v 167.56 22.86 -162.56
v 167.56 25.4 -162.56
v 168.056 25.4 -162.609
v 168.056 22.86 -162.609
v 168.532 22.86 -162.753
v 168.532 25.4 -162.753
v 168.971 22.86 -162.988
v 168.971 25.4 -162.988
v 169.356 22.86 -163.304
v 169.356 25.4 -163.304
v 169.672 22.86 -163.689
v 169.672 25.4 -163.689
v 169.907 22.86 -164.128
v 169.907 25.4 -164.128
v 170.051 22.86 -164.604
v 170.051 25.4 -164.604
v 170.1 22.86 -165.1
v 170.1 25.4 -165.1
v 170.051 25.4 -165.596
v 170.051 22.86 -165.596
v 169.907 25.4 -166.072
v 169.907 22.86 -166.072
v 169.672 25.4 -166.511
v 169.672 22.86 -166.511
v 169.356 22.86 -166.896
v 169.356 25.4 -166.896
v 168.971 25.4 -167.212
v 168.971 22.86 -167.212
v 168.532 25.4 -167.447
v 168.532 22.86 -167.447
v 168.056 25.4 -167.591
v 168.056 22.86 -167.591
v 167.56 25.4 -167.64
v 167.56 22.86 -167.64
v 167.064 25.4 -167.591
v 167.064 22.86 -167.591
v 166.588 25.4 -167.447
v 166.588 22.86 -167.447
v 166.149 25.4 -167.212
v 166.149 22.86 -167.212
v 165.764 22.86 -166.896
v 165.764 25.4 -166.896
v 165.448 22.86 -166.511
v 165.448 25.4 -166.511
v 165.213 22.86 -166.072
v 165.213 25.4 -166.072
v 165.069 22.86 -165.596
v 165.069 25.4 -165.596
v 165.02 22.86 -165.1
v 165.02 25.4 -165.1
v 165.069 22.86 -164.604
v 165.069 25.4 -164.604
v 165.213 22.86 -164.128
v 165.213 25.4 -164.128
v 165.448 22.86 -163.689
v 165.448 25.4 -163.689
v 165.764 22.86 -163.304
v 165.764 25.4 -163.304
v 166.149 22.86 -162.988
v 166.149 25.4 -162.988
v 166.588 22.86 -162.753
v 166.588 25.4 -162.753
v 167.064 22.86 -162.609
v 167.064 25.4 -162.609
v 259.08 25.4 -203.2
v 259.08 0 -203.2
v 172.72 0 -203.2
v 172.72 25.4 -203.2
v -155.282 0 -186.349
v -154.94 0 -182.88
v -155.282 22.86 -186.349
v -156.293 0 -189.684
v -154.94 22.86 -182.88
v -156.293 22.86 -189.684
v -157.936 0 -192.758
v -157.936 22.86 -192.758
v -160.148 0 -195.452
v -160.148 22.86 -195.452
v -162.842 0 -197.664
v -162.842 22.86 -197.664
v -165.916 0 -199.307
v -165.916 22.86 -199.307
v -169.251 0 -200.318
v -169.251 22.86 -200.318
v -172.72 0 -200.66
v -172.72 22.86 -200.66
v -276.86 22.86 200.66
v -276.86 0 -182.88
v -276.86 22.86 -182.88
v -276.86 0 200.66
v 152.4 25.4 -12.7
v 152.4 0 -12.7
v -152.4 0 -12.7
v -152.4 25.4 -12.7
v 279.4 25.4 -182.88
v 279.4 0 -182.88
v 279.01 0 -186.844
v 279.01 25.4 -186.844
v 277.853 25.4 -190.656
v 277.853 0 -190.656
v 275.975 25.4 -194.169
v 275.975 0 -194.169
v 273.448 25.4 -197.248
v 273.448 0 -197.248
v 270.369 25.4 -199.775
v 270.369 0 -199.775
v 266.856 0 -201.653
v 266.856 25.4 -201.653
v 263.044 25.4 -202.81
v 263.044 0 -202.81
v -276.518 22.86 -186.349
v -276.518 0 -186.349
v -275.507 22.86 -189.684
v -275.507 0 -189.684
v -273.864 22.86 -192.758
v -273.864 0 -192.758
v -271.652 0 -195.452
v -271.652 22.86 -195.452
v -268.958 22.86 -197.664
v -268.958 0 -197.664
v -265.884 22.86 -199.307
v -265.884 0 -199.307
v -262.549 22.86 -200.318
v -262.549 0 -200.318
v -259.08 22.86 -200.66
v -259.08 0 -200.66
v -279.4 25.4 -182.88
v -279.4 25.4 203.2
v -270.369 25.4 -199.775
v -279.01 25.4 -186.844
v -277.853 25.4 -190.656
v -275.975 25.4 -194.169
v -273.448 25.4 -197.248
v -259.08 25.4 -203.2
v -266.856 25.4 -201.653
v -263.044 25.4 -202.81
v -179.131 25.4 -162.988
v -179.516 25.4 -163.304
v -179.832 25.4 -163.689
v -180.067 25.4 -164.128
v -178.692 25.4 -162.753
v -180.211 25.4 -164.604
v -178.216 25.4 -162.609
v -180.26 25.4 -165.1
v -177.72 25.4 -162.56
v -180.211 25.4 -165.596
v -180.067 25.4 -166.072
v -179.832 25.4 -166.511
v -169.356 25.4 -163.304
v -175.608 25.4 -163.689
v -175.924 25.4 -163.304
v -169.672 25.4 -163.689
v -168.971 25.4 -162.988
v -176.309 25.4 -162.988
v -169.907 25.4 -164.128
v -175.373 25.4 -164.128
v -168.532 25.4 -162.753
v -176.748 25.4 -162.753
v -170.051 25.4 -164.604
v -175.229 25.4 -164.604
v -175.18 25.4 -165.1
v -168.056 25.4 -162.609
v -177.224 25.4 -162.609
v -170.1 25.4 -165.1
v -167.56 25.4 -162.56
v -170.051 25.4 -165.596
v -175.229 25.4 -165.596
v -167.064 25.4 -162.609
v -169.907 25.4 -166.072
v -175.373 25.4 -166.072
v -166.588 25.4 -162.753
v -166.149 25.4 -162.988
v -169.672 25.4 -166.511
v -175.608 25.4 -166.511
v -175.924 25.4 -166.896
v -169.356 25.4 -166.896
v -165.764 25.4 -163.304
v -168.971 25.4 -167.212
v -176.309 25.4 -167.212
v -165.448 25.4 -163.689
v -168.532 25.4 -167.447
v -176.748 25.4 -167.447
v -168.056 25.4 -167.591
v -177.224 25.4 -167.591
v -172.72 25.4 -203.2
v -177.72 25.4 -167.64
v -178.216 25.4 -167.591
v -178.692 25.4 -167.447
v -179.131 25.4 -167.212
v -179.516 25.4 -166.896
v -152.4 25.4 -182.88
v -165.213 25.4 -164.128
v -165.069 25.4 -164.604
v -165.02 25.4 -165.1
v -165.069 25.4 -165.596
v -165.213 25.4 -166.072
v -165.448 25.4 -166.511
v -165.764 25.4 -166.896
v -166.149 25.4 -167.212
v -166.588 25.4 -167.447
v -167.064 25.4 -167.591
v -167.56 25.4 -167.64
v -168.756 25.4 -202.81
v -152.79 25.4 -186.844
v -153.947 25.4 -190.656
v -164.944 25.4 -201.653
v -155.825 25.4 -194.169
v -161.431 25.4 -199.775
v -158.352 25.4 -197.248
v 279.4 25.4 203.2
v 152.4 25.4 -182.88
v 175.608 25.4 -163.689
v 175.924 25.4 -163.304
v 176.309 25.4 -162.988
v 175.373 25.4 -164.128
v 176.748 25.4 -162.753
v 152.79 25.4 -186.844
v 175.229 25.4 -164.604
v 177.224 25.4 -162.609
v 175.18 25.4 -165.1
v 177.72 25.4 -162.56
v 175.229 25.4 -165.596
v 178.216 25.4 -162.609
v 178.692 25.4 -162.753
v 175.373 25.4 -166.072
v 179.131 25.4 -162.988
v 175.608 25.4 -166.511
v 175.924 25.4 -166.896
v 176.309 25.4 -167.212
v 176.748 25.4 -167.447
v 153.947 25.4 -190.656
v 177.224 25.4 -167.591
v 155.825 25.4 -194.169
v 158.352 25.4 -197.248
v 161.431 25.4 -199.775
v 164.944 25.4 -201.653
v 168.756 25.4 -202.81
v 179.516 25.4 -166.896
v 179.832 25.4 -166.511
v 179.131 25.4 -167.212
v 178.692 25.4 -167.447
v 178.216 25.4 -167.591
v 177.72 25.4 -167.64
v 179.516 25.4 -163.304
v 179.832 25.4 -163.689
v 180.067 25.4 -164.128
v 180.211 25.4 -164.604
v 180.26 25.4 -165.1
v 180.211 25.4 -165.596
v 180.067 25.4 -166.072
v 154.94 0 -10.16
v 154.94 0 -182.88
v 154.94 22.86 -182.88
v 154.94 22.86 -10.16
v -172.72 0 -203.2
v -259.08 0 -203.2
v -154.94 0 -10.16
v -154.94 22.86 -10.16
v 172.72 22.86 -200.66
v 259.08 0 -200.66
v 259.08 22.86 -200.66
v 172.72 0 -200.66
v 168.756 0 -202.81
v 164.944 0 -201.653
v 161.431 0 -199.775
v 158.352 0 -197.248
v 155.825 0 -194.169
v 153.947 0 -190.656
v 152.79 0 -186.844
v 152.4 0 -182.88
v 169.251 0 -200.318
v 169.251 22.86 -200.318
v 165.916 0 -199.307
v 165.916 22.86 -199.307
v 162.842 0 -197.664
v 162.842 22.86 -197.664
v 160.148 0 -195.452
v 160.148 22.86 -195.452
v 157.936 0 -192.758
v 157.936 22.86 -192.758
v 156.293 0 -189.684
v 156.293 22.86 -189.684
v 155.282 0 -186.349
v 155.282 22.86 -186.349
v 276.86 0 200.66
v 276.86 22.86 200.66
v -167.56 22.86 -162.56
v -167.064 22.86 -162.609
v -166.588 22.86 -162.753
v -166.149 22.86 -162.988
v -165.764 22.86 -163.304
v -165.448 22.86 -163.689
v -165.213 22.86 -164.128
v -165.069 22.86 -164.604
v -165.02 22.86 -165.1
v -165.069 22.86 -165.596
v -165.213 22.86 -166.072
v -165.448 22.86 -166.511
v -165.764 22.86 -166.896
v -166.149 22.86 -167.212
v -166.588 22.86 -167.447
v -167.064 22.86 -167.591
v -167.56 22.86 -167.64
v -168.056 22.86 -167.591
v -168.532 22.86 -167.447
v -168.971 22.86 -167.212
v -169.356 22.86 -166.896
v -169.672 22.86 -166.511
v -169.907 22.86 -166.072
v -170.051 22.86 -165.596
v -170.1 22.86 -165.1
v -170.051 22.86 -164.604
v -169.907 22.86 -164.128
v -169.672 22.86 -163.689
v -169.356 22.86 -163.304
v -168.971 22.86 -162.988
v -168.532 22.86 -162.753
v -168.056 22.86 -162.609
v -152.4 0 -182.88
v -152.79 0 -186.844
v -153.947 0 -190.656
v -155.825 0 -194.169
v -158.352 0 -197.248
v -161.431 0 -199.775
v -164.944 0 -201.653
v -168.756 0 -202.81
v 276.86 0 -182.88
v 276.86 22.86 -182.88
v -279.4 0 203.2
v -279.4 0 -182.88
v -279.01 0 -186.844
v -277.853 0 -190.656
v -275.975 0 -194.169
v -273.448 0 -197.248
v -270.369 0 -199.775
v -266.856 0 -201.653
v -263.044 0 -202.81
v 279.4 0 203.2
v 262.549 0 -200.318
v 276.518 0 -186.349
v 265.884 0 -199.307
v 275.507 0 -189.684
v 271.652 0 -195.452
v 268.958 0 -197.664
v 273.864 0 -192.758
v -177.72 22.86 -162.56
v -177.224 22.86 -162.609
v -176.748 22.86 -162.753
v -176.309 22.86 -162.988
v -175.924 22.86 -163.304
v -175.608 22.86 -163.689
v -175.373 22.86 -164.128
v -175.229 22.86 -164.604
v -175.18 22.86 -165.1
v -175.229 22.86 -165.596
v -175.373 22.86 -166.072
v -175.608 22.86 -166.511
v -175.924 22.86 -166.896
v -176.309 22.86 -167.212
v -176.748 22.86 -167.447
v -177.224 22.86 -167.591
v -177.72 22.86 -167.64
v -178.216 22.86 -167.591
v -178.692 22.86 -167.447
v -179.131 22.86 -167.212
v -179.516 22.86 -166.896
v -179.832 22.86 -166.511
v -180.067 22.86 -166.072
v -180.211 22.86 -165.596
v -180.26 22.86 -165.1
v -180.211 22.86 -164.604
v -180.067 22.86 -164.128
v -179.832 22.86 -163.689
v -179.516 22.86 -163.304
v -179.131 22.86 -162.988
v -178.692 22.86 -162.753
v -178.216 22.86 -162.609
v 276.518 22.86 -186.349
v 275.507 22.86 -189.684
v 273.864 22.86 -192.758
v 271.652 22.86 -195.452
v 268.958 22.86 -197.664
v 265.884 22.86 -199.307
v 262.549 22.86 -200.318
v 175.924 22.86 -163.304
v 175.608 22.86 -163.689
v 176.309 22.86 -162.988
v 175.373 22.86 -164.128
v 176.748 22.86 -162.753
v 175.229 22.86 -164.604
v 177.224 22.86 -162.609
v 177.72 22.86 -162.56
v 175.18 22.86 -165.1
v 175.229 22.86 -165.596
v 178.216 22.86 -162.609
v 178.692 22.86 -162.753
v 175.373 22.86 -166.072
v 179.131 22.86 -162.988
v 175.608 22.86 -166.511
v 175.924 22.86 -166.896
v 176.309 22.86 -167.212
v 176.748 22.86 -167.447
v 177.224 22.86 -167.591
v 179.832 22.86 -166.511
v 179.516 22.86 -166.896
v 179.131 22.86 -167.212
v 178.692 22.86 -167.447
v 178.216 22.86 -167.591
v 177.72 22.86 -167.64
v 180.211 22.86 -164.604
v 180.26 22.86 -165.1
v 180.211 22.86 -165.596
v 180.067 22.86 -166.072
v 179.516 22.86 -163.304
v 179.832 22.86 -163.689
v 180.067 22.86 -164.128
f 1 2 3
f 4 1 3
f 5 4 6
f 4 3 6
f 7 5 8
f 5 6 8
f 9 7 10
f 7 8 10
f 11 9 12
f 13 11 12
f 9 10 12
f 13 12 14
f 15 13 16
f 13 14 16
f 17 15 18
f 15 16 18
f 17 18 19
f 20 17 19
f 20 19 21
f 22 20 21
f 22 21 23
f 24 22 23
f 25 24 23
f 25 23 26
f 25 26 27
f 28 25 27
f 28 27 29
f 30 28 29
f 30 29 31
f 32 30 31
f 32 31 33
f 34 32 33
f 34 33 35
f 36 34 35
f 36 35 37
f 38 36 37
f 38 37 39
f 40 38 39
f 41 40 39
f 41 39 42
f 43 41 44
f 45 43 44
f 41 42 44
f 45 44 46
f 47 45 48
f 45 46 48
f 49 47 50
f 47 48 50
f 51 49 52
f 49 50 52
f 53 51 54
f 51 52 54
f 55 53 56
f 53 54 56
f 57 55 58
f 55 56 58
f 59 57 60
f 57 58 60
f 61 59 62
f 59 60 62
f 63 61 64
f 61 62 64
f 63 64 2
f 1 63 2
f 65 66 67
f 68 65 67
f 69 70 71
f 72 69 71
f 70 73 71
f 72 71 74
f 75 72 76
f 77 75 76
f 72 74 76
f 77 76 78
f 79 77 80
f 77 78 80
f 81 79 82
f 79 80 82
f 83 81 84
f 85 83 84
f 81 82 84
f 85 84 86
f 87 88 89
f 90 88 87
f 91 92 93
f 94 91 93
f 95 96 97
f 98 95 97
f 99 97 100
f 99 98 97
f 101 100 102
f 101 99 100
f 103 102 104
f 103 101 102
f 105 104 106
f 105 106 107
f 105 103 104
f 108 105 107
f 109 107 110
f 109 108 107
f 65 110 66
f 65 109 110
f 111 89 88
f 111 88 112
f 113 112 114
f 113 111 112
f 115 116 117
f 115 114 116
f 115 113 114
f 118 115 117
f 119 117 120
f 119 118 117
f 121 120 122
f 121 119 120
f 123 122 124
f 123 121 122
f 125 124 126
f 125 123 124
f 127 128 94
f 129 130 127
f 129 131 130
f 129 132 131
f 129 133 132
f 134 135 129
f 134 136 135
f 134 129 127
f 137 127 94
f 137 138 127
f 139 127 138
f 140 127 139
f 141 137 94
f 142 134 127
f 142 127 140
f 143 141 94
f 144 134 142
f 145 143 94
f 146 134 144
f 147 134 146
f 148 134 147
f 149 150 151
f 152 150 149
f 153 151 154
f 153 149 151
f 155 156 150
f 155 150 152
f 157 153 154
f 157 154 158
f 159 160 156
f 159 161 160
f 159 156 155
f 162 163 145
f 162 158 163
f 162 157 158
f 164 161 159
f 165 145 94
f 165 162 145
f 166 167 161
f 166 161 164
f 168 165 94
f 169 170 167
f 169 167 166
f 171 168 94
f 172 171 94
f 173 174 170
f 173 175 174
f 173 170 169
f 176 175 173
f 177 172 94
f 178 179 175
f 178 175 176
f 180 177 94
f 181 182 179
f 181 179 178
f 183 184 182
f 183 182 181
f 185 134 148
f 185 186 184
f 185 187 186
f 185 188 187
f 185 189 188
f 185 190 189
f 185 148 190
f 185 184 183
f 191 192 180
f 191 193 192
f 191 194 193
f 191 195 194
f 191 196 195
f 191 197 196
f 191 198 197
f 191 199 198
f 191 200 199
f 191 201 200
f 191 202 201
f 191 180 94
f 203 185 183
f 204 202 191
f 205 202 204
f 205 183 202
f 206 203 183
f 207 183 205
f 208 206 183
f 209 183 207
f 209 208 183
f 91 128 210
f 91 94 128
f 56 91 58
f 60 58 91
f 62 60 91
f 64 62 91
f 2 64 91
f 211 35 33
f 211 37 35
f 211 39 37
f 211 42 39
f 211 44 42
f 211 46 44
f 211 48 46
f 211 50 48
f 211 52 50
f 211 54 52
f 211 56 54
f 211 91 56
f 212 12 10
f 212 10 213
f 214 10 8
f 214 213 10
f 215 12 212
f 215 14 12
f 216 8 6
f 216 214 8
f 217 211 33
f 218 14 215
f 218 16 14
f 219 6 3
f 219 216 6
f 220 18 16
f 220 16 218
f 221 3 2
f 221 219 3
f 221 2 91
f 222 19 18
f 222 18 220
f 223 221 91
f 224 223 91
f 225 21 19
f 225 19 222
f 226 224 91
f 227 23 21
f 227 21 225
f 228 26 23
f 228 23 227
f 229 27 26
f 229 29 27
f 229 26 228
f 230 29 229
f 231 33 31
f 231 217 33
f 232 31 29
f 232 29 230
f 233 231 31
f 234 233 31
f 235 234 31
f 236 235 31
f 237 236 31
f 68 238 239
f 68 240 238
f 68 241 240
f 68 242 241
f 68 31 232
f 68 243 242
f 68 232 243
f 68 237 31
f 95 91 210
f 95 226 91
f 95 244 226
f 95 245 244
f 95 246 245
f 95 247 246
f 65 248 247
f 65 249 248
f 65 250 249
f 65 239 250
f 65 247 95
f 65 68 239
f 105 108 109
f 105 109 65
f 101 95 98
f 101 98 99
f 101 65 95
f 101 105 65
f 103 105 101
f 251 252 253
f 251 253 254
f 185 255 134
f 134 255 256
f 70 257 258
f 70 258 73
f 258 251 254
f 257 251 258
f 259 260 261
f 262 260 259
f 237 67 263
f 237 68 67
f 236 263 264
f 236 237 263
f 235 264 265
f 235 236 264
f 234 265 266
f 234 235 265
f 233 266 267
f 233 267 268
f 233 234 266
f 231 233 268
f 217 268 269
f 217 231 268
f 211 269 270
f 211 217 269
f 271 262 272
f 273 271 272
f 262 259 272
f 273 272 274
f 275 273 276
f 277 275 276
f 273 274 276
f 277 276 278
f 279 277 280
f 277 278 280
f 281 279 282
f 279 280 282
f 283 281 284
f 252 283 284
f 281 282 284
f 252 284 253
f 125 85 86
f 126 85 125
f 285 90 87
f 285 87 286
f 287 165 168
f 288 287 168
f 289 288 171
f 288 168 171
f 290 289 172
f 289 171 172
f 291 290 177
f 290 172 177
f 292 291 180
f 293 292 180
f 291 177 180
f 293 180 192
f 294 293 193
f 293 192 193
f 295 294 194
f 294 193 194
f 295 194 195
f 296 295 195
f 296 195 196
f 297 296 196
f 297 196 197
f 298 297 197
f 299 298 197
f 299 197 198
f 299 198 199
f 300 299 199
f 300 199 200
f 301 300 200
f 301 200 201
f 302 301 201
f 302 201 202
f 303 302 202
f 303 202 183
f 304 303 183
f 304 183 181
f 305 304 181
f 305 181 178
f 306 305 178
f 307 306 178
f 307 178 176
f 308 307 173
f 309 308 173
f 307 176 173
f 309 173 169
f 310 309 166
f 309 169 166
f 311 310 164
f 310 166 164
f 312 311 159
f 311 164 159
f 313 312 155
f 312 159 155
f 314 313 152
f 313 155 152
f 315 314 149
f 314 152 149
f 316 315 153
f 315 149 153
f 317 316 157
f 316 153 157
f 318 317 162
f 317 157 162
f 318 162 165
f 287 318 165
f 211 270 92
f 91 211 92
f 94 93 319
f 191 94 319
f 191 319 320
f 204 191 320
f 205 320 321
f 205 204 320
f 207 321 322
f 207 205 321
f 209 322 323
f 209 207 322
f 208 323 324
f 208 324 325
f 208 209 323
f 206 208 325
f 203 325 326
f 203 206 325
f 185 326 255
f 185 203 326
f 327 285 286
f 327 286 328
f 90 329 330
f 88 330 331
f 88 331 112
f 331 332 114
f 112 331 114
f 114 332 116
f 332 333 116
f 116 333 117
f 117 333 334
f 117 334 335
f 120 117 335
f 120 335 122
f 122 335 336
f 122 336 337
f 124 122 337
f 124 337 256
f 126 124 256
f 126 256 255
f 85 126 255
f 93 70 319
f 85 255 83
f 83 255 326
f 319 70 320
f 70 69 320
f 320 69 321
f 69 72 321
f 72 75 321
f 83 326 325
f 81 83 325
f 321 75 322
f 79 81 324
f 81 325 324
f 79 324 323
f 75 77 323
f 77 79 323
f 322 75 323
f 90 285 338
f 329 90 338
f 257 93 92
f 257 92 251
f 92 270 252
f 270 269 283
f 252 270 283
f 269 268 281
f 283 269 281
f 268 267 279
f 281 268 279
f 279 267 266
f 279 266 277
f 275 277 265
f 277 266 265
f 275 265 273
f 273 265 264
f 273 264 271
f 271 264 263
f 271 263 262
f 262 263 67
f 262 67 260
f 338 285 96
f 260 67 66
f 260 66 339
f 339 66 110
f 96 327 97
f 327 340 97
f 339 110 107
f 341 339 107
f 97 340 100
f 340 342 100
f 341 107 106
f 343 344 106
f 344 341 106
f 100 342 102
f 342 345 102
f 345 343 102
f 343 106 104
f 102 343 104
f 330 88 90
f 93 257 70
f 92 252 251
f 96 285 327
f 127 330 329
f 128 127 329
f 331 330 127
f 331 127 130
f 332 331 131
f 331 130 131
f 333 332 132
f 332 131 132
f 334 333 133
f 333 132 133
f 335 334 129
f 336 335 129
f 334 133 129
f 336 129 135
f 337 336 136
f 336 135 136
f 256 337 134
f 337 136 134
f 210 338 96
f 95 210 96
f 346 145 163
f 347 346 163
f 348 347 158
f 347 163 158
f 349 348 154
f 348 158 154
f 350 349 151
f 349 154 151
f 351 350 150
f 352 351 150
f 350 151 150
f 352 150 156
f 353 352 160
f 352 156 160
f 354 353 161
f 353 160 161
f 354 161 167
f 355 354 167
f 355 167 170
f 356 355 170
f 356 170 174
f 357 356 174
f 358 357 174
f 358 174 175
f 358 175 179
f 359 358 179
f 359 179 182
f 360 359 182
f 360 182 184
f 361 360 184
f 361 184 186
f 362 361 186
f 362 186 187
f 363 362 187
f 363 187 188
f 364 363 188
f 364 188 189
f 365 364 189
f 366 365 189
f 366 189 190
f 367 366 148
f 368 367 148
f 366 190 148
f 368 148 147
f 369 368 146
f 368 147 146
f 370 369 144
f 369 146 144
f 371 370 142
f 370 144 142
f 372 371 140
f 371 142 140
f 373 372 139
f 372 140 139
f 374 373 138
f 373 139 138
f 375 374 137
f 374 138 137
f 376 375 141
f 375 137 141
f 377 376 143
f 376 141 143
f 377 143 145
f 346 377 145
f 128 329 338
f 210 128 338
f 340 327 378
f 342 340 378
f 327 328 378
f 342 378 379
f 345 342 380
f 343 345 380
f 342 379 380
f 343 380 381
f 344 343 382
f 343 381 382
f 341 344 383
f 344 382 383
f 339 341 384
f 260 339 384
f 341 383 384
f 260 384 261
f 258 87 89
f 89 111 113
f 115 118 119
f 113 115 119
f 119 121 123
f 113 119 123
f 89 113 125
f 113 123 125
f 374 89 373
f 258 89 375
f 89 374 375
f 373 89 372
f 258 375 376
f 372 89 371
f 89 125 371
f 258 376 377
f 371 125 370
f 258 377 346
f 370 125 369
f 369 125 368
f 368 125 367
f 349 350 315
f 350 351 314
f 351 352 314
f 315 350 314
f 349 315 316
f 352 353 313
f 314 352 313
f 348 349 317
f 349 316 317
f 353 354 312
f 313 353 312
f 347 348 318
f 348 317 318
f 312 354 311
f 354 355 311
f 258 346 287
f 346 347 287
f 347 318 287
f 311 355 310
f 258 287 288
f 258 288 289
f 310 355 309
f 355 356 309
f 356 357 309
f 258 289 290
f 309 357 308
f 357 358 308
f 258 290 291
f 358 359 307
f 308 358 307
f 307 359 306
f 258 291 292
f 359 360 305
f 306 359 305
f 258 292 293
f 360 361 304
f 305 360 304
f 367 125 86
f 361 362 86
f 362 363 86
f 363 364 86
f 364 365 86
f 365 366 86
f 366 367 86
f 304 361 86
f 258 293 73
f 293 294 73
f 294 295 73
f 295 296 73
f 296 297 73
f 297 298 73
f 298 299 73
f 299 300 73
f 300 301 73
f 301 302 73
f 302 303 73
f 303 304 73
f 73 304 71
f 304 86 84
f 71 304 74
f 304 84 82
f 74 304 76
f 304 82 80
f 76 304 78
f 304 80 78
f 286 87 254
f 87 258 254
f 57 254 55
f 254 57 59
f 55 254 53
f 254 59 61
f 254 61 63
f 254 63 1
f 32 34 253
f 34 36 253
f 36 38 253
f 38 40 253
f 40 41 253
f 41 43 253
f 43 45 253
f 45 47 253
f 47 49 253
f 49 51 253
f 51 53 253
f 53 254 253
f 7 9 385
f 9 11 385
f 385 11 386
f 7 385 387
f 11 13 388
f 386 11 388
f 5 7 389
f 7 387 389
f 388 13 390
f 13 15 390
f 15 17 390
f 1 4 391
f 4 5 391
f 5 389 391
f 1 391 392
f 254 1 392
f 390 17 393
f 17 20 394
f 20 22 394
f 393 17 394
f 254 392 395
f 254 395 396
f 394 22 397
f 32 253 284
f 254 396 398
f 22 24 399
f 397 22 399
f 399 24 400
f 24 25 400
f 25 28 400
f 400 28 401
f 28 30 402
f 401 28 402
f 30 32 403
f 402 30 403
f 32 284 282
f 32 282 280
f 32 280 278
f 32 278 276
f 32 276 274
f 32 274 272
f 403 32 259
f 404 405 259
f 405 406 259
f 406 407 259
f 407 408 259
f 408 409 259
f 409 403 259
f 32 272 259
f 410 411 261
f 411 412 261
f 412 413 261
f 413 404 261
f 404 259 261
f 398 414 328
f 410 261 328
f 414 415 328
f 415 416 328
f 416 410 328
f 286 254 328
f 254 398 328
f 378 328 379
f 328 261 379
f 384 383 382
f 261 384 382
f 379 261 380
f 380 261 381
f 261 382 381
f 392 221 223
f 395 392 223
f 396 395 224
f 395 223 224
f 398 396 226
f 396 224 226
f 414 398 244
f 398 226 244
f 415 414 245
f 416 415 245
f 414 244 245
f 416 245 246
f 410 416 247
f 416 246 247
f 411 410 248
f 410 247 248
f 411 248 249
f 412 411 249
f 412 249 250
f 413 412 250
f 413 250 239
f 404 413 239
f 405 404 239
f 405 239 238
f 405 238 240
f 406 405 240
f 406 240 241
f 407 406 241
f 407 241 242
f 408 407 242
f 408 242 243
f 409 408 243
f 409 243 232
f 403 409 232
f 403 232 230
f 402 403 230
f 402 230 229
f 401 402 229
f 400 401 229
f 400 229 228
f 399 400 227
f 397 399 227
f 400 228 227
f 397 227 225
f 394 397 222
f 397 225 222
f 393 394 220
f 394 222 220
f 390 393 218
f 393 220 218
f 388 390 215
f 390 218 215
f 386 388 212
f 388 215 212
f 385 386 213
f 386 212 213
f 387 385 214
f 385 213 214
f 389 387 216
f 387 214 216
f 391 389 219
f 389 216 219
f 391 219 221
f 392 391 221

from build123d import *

# Parameters (mm, degrees)
BOSS_EXTRUDE1_DEPTH = 25.4
FILLET1_R           = 20.32
SHELL1_T            = -2.54
SKETCH2_R           = 2.54
CUT_EXTRUDE1_DEPTH  = 347.409815103


with BuildPart() as part:
    # Sketch1 → Boss-Extrude1 (new body)
    with BuildSketch(Plane(origin=(0, 0, 0), x_dir=(1, 0, 0), z_dir=(0, 1, 0))):
        Polygon((-279.4, 203.2), (-279.4, -203.2), (279.4, -203.2), (279.4, 203.2), (152.4, 203.2), (152.4, 12.7), (-152.4, 12.7), (-152.4, 203.2), align=None)
    extrude(amount=BOSS_EXTRUDE1_DEPTH)

    # Fillet1
    fillet1_edges = [part.edges().sort_by_distance(p)[0] for p in [
        (279.4, 12.7, -203.2),
        (-279.4, 12.7, -203.2),
        (-152.4, 12.7, -203.2),
        (152.4, 12.7, -203.2),
    ]]
    fillet(fillet1_edges, radius=FILLET1_R)

    # Shell1
    shell1_openings = [part.faces().sort_by_distance(p)[0] for p in [
        (0, 0, 37.577423361),
    ]]
    offset(amount=SHELL1_T, openings=shell1_openings, kind=Kind.INTERSECTION)

    # Sketch2 → Cut-Extrude1 (cut, through all)
    with BuildSketch(Plane(origin=(0, 25.4, 0), x_dir=(1, 0, 0), z_dir=(0, 1, 0))):
        with Locations(Location((-177.72, 165.1, 0), (0, 0, 270))):
            Circle(SKETCH2_R)
        with Locations(Location((-167.56, 165.1, 0), (0, 0, 270))):
            Circle(SKETCH2_R)
        with Locations(Location((167.56, 165.1, 0), (0, 0, 270))):
            Circle(SKETCH2_R)
        with Locations(Location((177.72, 165.1, 0), (0, 0, 270))):
            Circle(SKETCH2_R)
    extrude(amount=-CUT_EXTRUDE1_DEPTH, mode=Mode.SUBTRACT)


solid = part.part
